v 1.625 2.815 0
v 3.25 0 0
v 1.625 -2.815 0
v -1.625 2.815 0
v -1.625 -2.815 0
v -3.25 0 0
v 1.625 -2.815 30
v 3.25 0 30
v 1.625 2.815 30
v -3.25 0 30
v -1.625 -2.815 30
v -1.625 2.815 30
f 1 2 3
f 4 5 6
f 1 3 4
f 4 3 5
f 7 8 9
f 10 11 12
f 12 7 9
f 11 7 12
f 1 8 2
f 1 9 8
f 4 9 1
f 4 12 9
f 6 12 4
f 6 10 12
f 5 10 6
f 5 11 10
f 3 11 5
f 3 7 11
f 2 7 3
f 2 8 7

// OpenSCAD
module leg_connector(){
linear_extrude(height=30) circle($fn=6, d=6.5);    
}

leg_connector();
